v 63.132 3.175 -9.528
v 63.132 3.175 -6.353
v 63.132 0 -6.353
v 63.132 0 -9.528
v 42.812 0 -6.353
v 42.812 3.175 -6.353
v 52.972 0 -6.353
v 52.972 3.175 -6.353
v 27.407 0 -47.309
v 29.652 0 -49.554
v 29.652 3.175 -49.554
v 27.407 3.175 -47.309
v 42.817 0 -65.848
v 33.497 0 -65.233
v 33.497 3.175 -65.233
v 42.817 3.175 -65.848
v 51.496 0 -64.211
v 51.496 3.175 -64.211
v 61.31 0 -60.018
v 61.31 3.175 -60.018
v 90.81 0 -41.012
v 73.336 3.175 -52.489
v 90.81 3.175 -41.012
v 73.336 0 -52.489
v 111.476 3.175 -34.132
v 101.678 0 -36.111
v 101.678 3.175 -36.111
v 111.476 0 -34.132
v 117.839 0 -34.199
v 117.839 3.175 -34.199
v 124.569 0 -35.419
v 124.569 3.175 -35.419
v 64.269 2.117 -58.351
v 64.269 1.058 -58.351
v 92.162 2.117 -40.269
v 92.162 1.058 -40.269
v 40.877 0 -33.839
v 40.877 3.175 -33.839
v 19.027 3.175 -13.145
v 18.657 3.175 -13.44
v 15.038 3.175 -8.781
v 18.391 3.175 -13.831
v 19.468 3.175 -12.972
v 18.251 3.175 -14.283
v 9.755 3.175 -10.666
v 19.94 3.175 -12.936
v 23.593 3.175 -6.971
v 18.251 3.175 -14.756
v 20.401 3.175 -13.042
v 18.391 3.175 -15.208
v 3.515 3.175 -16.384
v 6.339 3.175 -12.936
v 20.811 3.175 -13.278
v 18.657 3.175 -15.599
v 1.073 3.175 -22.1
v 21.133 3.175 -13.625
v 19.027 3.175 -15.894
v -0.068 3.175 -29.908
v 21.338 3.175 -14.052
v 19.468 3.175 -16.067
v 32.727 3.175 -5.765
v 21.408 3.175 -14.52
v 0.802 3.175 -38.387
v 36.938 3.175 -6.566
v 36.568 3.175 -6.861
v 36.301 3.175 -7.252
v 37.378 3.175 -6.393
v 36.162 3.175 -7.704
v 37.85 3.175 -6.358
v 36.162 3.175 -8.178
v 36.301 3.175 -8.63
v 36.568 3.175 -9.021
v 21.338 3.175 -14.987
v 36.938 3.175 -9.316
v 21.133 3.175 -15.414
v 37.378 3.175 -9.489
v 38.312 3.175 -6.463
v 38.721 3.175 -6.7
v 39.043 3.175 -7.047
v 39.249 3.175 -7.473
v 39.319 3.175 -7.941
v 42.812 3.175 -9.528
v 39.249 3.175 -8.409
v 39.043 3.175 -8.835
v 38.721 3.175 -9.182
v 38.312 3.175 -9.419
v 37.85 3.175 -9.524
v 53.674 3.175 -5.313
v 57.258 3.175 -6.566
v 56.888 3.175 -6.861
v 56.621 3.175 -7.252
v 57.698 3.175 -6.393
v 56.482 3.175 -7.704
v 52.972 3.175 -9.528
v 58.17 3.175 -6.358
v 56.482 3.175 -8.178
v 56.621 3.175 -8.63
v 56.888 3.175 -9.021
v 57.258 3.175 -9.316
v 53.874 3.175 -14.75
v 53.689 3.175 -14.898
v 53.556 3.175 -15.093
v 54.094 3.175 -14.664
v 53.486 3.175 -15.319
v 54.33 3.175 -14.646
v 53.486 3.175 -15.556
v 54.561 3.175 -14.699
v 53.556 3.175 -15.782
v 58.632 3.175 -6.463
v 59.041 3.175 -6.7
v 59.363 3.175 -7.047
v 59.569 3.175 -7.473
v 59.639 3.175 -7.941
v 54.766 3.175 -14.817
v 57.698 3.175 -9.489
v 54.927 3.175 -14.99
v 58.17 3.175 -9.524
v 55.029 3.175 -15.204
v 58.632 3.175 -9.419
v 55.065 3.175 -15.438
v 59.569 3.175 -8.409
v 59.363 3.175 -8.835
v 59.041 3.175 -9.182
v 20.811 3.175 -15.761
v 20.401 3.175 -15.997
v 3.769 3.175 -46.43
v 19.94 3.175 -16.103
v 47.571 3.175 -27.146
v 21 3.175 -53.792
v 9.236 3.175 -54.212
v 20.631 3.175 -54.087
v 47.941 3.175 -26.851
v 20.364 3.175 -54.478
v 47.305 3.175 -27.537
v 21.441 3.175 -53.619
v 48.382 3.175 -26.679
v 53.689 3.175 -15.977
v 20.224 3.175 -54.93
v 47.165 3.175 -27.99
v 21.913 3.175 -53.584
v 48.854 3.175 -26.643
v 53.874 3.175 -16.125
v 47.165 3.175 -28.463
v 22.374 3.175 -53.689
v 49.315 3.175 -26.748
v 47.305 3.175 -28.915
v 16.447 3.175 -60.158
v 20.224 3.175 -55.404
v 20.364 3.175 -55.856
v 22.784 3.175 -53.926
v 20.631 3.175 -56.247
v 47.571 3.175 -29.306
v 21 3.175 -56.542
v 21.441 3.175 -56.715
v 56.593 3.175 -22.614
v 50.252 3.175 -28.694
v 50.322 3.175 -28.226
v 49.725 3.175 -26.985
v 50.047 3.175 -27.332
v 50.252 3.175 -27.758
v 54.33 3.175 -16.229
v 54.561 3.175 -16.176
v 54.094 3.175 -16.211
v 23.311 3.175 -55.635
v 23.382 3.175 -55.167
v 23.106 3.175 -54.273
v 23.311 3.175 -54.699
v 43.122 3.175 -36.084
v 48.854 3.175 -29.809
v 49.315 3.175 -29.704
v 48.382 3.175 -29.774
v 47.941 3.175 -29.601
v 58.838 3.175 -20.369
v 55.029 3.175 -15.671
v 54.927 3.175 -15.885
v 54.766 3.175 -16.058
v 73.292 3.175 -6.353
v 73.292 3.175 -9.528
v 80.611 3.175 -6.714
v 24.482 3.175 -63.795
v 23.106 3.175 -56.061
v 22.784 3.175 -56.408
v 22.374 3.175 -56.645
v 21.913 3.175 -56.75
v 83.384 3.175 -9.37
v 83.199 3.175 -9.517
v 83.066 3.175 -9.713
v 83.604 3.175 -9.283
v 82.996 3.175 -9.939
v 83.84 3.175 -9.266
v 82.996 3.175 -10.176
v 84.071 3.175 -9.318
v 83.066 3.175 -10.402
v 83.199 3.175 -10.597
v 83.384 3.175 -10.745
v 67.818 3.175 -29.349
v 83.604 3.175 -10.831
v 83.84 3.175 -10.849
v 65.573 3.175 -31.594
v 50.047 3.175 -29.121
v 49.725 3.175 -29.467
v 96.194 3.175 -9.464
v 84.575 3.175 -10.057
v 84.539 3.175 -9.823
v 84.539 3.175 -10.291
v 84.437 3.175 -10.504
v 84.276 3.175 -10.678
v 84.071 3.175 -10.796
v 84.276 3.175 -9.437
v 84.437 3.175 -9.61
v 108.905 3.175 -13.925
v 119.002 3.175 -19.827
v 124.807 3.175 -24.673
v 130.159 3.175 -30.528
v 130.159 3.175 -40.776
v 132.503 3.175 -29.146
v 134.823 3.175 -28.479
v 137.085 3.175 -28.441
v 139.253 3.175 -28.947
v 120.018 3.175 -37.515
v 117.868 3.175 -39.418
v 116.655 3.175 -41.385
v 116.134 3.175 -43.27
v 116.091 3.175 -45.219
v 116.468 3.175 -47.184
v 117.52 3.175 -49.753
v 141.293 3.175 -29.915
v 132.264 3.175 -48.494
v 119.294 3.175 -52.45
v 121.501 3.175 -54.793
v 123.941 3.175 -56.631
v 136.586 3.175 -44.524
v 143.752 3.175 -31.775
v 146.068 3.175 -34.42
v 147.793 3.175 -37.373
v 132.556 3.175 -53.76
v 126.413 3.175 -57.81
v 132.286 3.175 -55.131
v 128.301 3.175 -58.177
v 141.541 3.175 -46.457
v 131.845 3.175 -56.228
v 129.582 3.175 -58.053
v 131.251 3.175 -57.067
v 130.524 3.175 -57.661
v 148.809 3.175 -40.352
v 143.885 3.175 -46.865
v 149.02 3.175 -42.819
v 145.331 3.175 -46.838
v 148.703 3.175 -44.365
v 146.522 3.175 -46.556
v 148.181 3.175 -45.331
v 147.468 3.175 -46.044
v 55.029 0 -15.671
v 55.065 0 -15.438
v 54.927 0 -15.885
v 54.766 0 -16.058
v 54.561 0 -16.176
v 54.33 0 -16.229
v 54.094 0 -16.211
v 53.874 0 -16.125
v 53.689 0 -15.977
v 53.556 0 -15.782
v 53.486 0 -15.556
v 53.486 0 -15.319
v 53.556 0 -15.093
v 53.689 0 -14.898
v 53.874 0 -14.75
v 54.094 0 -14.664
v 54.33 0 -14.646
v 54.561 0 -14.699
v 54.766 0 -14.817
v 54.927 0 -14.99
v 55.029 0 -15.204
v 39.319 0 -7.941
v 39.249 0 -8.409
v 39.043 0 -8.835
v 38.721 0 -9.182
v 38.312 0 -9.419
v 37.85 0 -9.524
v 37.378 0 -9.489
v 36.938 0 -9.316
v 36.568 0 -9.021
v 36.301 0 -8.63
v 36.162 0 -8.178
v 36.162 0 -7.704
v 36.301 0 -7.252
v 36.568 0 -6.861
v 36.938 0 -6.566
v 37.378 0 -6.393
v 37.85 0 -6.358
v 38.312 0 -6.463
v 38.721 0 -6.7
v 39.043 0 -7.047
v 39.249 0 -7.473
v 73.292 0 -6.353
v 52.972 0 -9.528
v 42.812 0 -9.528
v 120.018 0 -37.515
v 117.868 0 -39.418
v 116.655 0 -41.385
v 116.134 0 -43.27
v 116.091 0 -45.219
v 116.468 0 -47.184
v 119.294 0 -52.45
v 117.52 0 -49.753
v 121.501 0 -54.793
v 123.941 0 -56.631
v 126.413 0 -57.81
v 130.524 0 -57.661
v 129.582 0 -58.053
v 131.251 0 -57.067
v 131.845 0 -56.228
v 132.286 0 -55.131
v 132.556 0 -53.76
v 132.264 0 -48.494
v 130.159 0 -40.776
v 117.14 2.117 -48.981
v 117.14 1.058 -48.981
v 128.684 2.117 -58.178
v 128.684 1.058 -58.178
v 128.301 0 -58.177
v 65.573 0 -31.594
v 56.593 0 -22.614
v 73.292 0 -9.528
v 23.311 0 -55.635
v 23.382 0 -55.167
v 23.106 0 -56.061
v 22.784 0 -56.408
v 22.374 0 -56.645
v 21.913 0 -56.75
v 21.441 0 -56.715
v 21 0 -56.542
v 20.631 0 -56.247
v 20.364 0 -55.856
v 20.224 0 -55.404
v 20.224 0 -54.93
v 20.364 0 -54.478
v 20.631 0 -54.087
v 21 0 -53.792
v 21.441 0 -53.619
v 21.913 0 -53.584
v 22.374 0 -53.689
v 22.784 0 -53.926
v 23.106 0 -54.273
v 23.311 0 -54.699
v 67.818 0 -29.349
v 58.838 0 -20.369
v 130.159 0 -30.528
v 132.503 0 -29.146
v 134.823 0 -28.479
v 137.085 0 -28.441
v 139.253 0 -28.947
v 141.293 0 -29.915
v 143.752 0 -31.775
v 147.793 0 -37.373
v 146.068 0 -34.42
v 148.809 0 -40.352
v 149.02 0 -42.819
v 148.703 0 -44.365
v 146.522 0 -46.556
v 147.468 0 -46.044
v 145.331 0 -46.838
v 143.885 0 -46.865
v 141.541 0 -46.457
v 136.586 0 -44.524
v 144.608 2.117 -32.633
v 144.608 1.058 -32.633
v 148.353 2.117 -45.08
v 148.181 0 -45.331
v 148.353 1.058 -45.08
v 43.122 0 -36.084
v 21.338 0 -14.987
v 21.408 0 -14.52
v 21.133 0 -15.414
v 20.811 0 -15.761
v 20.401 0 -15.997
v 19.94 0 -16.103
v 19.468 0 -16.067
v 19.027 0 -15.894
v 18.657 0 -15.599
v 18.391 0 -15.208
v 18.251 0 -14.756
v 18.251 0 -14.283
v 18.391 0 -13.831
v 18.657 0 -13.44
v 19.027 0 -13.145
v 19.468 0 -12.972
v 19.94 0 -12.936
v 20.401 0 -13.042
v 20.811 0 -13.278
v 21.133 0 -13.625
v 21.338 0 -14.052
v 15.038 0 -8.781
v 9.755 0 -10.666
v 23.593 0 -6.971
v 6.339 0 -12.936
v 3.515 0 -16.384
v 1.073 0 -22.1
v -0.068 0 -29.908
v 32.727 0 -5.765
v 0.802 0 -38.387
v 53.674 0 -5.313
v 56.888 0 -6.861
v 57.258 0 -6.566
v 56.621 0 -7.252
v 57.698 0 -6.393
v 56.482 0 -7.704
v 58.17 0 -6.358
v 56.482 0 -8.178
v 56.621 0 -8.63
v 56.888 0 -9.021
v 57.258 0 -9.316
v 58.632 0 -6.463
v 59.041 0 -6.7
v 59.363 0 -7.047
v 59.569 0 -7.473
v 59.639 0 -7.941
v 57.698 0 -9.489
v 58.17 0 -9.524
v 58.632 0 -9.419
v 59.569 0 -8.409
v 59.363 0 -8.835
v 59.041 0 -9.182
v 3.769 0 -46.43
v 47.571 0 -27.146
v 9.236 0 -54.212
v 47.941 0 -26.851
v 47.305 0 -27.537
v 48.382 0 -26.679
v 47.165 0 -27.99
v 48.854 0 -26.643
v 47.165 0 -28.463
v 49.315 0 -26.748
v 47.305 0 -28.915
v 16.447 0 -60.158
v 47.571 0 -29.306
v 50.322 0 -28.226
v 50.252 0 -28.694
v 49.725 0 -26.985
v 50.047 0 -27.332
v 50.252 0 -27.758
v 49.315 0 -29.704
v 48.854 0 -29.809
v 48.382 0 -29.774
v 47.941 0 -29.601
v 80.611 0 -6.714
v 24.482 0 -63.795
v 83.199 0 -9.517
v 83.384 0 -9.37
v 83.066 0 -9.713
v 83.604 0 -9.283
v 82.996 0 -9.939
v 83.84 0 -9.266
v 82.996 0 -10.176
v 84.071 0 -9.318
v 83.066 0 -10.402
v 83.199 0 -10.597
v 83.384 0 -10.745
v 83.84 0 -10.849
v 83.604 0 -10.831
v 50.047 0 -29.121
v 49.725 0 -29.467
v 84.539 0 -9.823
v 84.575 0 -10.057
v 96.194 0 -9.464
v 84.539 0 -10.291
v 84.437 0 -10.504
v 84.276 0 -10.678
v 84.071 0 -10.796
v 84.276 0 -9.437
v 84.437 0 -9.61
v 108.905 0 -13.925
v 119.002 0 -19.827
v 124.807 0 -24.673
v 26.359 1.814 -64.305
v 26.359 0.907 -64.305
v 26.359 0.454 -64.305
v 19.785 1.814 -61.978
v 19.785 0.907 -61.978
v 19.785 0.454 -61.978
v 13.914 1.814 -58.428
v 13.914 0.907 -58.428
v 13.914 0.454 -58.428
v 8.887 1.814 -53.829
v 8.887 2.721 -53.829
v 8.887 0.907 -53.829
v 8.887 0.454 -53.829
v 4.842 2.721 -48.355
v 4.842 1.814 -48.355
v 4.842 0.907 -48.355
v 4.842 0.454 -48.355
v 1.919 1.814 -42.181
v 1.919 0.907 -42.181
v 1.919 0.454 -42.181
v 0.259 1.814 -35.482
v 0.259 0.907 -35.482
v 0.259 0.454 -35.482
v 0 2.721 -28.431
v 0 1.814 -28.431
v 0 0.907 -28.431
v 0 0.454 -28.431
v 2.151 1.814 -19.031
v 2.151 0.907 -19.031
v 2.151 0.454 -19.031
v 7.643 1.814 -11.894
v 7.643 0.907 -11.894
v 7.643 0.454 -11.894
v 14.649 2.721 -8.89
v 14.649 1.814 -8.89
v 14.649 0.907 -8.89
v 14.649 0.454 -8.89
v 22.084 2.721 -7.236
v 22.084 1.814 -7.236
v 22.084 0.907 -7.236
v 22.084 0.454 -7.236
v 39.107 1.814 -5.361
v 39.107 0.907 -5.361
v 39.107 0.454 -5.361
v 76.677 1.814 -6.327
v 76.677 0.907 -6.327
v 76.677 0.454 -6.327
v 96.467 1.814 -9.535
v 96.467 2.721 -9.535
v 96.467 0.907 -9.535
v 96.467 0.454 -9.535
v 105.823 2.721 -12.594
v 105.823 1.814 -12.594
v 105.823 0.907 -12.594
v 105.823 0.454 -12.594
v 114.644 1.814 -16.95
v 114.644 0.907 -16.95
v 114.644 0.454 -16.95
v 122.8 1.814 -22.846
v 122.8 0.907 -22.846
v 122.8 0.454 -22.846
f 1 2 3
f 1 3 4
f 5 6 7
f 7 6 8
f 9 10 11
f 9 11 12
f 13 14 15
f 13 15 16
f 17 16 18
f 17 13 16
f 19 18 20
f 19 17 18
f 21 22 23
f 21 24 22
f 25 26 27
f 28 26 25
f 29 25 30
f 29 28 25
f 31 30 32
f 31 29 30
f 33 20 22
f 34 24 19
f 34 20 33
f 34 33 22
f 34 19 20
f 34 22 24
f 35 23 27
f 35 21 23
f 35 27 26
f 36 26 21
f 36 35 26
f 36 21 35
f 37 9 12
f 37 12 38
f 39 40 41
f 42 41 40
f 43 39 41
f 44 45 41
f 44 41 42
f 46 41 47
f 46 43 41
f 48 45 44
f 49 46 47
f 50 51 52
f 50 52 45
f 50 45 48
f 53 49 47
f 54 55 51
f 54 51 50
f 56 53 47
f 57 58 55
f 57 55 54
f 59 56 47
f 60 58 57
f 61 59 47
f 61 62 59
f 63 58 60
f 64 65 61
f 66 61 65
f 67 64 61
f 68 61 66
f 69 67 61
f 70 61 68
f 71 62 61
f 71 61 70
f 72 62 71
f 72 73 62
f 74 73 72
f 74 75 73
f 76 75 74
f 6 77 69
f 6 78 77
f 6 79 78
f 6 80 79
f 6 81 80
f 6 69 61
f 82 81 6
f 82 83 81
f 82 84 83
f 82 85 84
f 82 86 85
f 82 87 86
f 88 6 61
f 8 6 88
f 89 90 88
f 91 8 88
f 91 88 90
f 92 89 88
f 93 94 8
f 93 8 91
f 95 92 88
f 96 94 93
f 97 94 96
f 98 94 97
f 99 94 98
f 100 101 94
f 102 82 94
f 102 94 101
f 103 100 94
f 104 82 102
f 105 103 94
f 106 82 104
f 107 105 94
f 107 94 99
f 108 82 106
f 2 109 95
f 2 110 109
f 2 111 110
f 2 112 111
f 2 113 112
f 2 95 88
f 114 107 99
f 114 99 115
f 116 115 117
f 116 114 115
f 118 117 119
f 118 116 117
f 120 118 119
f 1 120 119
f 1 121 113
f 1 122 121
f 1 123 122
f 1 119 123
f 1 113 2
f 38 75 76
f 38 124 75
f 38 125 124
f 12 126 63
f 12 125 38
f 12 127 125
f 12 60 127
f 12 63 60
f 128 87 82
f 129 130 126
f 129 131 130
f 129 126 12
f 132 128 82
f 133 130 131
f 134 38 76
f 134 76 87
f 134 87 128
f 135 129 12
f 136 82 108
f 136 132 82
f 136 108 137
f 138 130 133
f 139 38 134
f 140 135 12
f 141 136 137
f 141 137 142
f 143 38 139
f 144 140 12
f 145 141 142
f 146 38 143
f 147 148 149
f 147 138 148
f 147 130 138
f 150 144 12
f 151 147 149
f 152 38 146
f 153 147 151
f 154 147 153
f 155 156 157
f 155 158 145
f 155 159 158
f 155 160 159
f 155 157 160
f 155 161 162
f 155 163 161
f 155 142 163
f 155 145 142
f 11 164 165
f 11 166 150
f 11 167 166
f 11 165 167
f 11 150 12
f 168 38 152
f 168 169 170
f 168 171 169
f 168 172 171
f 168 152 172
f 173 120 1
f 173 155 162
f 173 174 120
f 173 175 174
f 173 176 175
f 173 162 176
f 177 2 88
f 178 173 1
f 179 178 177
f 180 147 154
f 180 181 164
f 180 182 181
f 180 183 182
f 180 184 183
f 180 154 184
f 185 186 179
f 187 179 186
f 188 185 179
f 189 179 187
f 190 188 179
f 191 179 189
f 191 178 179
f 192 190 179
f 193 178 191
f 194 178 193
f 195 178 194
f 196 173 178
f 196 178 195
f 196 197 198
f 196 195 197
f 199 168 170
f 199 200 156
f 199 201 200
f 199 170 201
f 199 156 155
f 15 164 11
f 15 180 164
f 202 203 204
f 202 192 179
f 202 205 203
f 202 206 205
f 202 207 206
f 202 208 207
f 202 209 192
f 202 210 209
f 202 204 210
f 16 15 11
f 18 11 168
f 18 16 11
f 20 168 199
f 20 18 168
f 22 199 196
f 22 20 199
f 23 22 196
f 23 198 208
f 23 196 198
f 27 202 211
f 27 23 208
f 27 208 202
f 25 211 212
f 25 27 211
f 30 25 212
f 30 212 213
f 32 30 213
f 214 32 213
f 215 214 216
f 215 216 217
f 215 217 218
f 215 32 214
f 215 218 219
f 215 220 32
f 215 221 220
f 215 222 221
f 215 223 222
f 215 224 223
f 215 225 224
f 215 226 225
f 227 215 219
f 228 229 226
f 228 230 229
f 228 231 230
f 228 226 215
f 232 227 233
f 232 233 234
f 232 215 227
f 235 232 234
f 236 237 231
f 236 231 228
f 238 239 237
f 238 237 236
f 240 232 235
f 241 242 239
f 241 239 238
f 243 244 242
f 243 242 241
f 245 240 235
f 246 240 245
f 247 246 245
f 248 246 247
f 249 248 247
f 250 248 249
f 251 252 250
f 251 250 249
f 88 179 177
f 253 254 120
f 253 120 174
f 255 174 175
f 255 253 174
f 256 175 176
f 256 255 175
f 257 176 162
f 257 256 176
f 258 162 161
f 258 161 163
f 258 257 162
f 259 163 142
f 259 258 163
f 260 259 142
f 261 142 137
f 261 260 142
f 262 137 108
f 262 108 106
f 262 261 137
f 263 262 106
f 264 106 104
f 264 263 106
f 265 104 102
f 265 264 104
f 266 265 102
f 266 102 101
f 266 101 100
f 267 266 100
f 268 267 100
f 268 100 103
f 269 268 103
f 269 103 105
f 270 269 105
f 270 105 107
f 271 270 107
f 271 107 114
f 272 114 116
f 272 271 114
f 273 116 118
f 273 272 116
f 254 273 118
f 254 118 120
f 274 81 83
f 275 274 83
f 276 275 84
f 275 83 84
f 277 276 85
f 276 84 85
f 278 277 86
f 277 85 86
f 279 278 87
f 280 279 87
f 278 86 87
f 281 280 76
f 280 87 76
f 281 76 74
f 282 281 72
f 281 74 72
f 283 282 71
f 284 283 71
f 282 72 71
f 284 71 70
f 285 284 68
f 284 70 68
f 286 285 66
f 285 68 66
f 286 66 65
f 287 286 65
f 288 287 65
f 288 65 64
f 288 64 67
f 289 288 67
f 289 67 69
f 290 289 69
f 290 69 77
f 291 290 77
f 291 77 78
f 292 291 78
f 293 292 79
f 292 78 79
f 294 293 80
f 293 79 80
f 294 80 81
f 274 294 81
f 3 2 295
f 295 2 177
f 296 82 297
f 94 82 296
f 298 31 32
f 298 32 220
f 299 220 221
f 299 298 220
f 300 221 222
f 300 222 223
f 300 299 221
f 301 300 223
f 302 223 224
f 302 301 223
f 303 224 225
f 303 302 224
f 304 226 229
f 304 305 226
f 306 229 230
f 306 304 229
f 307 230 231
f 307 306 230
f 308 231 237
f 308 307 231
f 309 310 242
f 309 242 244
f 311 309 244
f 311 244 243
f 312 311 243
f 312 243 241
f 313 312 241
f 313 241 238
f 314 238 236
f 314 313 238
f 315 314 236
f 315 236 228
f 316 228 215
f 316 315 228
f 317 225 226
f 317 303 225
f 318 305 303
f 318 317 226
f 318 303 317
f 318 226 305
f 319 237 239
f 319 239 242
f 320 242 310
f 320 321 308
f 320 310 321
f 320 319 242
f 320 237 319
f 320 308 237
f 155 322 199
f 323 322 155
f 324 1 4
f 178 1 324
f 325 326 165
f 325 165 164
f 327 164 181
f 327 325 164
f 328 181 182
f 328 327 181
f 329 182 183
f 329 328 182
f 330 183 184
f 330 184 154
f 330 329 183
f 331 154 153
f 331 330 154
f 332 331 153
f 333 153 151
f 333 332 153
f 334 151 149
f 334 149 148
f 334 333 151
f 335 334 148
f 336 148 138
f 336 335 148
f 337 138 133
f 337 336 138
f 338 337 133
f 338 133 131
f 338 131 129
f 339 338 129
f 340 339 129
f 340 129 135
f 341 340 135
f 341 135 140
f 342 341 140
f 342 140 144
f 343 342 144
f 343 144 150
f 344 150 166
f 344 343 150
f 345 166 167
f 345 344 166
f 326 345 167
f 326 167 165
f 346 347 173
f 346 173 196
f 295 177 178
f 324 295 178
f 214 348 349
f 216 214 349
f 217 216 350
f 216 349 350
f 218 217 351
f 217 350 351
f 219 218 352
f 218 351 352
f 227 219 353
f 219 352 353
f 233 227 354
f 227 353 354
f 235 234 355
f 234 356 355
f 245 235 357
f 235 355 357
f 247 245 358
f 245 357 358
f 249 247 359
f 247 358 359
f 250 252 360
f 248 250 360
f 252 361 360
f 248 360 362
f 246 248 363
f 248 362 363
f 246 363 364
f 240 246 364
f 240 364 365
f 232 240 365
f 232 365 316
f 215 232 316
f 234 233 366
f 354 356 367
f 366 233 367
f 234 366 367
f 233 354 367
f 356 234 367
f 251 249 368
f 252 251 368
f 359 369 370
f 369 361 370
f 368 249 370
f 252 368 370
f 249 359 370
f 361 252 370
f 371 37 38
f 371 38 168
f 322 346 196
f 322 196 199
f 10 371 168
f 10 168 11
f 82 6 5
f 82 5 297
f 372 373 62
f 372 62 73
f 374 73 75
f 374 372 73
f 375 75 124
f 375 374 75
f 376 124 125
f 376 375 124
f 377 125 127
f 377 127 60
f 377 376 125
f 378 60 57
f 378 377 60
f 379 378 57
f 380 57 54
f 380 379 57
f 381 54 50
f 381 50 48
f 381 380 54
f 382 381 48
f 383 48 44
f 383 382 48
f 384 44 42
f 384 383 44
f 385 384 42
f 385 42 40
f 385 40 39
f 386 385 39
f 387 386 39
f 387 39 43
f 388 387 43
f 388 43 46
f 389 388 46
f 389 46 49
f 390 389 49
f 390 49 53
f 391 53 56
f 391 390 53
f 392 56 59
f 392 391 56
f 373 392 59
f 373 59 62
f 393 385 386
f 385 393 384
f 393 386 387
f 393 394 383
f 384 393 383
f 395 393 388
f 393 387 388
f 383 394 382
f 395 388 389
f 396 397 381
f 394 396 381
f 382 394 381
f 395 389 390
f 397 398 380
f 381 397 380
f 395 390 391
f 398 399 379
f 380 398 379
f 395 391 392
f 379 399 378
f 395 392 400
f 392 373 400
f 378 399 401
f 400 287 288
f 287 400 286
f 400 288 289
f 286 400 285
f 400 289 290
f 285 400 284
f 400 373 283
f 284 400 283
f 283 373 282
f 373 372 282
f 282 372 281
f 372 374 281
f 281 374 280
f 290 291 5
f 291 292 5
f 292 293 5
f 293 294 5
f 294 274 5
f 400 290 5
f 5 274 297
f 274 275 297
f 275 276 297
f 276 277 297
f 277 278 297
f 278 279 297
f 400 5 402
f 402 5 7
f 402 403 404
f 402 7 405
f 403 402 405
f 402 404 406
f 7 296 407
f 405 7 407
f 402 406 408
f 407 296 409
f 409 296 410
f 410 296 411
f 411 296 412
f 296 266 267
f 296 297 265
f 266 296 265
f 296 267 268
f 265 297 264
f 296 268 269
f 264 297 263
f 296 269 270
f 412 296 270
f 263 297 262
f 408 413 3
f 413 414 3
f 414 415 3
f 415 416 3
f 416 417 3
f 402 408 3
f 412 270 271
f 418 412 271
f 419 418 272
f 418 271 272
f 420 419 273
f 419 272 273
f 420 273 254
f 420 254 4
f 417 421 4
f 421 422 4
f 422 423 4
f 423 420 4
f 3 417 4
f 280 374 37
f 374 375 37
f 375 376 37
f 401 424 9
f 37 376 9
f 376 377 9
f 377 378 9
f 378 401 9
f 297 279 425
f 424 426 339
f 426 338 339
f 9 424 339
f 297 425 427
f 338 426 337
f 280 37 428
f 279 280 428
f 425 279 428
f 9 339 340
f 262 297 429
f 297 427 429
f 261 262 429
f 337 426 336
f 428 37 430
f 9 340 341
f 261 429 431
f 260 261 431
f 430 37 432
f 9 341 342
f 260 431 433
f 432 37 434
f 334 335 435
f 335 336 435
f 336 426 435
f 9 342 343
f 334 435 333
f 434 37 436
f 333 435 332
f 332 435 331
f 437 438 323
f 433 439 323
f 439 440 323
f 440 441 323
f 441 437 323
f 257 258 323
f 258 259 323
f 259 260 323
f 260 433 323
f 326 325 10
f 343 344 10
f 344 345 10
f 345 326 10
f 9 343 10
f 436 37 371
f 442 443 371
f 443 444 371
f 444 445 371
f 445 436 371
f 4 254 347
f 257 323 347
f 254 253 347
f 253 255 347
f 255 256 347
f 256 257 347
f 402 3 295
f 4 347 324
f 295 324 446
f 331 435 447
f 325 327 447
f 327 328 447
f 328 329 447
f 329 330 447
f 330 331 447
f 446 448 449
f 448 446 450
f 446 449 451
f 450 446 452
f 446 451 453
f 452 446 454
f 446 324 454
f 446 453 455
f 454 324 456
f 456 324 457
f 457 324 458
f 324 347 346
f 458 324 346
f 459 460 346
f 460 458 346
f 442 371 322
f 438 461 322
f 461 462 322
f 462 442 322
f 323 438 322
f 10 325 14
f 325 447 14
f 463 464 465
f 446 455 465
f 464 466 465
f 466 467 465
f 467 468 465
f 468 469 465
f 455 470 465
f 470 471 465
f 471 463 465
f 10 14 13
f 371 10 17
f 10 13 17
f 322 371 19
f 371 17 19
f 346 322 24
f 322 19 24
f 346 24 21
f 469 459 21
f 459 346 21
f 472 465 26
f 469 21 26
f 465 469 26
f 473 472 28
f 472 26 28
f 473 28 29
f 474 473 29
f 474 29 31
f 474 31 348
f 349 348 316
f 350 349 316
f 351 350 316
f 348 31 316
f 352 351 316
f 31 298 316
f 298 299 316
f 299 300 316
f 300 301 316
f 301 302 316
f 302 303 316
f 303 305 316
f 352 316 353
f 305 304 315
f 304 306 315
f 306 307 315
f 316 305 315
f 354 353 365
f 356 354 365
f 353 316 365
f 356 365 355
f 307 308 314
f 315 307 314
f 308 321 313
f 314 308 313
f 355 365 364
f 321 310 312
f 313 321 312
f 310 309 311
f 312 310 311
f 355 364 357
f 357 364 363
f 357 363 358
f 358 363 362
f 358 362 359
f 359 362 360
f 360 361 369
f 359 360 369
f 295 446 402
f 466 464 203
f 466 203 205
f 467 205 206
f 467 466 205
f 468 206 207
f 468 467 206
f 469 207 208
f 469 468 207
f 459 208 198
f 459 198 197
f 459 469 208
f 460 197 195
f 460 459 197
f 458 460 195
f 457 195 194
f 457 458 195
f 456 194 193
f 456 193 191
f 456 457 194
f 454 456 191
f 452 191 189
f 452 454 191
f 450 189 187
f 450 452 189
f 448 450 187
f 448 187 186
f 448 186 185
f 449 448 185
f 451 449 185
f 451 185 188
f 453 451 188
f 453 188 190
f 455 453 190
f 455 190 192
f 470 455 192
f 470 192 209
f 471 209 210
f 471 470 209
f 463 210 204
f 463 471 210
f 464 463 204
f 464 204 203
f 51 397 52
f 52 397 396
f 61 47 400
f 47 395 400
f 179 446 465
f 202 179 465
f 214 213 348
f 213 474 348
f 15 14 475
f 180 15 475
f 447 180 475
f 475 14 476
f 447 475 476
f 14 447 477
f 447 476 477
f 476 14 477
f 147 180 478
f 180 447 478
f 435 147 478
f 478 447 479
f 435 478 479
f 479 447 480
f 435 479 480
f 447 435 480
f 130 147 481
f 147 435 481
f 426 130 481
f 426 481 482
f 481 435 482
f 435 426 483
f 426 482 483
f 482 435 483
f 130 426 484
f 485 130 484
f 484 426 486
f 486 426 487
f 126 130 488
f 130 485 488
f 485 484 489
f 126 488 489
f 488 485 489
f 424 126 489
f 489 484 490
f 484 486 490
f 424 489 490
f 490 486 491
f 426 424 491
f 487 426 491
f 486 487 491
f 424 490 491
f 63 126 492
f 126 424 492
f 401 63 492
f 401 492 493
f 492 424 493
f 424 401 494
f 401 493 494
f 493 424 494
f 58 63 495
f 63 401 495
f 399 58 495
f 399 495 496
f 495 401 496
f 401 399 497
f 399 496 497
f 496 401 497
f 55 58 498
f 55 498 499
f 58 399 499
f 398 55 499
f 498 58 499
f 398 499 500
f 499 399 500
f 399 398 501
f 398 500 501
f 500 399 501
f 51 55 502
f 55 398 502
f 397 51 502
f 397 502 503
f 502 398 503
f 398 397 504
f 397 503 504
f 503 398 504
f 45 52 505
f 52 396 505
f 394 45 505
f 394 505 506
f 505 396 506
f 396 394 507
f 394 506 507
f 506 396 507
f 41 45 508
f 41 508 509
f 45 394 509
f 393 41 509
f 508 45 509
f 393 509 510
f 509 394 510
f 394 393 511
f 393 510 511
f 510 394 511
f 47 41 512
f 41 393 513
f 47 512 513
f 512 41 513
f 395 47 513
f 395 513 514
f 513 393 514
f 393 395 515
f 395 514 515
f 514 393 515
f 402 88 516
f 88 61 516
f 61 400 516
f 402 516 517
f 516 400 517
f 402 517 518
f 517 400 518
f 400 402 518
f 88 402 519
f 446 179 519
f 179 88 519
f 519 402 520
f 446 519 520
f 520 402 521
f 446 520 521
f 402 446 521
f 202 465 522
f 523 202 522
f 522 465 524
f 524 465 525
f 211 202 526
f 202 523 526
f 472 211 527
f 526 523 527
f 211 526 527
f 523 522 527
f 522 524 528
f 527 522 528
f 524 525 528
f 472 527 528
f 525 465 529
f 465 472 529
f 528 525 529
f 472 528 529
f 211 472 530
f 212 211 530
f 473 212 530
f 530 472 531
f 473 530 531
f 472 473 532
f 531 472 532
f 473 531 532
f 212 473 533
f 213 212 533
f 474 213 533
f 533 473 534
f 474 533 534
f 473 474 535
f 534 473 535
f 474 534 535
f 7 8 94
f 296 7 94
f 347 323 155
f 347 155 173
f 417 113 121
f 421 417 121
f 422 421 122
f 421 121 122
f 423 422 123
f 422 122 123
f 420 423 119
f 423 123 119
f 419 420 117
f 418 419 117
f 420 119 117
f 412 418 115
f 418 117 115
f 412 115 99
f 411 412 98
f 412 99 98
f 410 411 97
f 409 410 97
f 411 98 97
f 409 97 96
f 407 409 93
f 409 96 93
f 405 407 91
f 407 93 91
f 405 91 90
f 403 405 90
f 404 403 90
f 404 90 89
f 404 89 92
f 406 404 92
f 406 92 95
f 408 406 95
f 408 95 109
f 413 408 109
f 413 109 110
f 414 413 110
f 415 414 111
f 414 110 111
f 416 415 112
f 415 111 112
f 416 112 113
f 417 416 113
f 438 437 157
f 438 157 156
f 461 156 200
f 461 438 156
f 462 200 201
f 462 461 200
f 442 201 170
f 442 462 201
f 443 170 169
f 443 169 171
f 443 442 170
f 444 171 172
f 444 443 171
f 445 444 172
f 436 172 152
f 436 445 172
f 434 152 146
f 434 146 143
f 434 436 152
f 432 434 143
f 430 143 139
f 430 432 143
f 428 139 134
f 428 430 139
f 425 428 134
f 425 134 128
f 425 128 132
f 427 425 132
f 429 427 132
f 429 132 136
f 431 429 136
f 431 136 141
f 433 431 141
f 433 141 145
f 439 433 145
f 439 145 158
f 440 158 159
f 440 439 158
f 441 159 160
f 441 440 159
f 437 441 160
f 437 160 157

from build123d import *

# Parameters (mm, degrees)
SKETCH2_R           = 0.79375
SKETCH2_R_2         = 1.5875
BOSS_EXTRUDE1_DEPTH = 3.175
SKETCH6_R           = 1.5875
SKETCH6_W           = 10.16
SKETCH6_H           = 3.175
CUT_EXTRUDE7_DEPTH  = 3.175


with BuildPart() as part:
    # Sketch2 → Boss-Extrude1 (new body)
    with BuildSketch(Plane(origin=(0, 0, 0), x_dir=(1, 0, 0), z_dir=(0, 1, 0))):
        with BuildLine():
            add(Edge.make_bspline(
                [(33.497009682, 65.232830434), (13.835847475, 64.776830272), (-6.409764626, 41.73429338), (3.622545376, 12.806591648), (14.401932892, 8.751185323), (21.866269504, 7.208900872), (35.976831579, 4.999507913), (73.987200978, 5.536603608), (111.714388313, 7.447421867), (130.159055539, 30.527662162)],
                knots=[0, 0, 0, 0, 0.267337016, 0.357505563, 0.391567423, 0.432956685, 0.471433917, 0.602900813, 1, 1, 1, 1], degree=3))
            add(Edge.make_bspline(
                [(130.159055539, 30.527662162), (146.215631414, 18.430501295), (163.066903523, 62.486021671), (130.159055539, 40.776168229)],
                knots=[0, 0, 0, 0, 1, 1, 1, 1], degree=3))
            add(Edge.make_bspline(
                [(124.56896132, 35.418994603), (97.971761813, 43.753617373), (143.399689125, 78.887876507), (130.159055539, 40.776168229)],
                knots=[0, 0, 0, 0, 1, 1, 1, 1], degree=3))
            add(Edge.make_bspline(
                [(33.497009682, 65.232830434), (68.171069047, 72.094325348), (87.442597609, 25.509886786), (124.56896132, 35.418994603)],
                knots=[0, 0, 0, 0, 1, 1, 1, 1], degree=3))
        make_face()
        with Locations((54.270772962, 15.437527161)):
            Circle(SKETCH2_R, mode=Mode.SUBTRACT)
        with Locations((83.780763613, 10.057323349)):
            Circle(SKETCH2_R, mode=Mode.SUBTRACT)
        with Locations((21.794225131, 55.167022129)):
            Circle(SKETCH2_R_2, mode=Mode.SUBTRACT)
        with Locations((48.734993495, 28.226253766)):
            Circle(SKETCH2_R_2, mode=Mode.SUBTRACT)
        with Locations((19.8209749, 14.519501599)):
            Circle(SKETCH2_R_2, mode=Mode.SUBTRACT)
        Polygon((27.406885207, 47.309298023), (40.877269389, 33.838913841), (43.122333419, 36.083977871), (29.651949237, 49.554362053), align=None, mode=Mode.SUBTRACT)
        Polygon((58.837781631, 20.36852966), (67.818037752, 29.348785781), (65.572973722, 31.593849811), (56.5927176, 22.61359369), align=None, mode=Mode.SUBTRACT)
    extrude(amount=BOSS_EXTRUDE1_DEPTH)

    # Sketch6 → Cut-Extrude7 (cut)
    with BuildSketch(Plane(origin=(0, 3.175, 0), x_dir=(1, 0, 0), z_dir=(0, 1, 0))):
        with Locations((37.731588031, 7.940901599)):
            Circle(SKETCH6_R)
        with Locations((47.891588031, 7.940901599)):
            Rectangle(SKETCH6_W, SKETCH6_H)
        with Locations((58.051588031, 7.940901599)):
            Circle(SKETCH6_R)
        with Locations((68.211588031, 7.940901599)):
            Rectangle(SKETCH6_W, SKETCH6_H)
    extrude(amount=-CUT_EXTRUDE7_DEPTH, mode=Mode.SUBTRACT)


solid = part.part
